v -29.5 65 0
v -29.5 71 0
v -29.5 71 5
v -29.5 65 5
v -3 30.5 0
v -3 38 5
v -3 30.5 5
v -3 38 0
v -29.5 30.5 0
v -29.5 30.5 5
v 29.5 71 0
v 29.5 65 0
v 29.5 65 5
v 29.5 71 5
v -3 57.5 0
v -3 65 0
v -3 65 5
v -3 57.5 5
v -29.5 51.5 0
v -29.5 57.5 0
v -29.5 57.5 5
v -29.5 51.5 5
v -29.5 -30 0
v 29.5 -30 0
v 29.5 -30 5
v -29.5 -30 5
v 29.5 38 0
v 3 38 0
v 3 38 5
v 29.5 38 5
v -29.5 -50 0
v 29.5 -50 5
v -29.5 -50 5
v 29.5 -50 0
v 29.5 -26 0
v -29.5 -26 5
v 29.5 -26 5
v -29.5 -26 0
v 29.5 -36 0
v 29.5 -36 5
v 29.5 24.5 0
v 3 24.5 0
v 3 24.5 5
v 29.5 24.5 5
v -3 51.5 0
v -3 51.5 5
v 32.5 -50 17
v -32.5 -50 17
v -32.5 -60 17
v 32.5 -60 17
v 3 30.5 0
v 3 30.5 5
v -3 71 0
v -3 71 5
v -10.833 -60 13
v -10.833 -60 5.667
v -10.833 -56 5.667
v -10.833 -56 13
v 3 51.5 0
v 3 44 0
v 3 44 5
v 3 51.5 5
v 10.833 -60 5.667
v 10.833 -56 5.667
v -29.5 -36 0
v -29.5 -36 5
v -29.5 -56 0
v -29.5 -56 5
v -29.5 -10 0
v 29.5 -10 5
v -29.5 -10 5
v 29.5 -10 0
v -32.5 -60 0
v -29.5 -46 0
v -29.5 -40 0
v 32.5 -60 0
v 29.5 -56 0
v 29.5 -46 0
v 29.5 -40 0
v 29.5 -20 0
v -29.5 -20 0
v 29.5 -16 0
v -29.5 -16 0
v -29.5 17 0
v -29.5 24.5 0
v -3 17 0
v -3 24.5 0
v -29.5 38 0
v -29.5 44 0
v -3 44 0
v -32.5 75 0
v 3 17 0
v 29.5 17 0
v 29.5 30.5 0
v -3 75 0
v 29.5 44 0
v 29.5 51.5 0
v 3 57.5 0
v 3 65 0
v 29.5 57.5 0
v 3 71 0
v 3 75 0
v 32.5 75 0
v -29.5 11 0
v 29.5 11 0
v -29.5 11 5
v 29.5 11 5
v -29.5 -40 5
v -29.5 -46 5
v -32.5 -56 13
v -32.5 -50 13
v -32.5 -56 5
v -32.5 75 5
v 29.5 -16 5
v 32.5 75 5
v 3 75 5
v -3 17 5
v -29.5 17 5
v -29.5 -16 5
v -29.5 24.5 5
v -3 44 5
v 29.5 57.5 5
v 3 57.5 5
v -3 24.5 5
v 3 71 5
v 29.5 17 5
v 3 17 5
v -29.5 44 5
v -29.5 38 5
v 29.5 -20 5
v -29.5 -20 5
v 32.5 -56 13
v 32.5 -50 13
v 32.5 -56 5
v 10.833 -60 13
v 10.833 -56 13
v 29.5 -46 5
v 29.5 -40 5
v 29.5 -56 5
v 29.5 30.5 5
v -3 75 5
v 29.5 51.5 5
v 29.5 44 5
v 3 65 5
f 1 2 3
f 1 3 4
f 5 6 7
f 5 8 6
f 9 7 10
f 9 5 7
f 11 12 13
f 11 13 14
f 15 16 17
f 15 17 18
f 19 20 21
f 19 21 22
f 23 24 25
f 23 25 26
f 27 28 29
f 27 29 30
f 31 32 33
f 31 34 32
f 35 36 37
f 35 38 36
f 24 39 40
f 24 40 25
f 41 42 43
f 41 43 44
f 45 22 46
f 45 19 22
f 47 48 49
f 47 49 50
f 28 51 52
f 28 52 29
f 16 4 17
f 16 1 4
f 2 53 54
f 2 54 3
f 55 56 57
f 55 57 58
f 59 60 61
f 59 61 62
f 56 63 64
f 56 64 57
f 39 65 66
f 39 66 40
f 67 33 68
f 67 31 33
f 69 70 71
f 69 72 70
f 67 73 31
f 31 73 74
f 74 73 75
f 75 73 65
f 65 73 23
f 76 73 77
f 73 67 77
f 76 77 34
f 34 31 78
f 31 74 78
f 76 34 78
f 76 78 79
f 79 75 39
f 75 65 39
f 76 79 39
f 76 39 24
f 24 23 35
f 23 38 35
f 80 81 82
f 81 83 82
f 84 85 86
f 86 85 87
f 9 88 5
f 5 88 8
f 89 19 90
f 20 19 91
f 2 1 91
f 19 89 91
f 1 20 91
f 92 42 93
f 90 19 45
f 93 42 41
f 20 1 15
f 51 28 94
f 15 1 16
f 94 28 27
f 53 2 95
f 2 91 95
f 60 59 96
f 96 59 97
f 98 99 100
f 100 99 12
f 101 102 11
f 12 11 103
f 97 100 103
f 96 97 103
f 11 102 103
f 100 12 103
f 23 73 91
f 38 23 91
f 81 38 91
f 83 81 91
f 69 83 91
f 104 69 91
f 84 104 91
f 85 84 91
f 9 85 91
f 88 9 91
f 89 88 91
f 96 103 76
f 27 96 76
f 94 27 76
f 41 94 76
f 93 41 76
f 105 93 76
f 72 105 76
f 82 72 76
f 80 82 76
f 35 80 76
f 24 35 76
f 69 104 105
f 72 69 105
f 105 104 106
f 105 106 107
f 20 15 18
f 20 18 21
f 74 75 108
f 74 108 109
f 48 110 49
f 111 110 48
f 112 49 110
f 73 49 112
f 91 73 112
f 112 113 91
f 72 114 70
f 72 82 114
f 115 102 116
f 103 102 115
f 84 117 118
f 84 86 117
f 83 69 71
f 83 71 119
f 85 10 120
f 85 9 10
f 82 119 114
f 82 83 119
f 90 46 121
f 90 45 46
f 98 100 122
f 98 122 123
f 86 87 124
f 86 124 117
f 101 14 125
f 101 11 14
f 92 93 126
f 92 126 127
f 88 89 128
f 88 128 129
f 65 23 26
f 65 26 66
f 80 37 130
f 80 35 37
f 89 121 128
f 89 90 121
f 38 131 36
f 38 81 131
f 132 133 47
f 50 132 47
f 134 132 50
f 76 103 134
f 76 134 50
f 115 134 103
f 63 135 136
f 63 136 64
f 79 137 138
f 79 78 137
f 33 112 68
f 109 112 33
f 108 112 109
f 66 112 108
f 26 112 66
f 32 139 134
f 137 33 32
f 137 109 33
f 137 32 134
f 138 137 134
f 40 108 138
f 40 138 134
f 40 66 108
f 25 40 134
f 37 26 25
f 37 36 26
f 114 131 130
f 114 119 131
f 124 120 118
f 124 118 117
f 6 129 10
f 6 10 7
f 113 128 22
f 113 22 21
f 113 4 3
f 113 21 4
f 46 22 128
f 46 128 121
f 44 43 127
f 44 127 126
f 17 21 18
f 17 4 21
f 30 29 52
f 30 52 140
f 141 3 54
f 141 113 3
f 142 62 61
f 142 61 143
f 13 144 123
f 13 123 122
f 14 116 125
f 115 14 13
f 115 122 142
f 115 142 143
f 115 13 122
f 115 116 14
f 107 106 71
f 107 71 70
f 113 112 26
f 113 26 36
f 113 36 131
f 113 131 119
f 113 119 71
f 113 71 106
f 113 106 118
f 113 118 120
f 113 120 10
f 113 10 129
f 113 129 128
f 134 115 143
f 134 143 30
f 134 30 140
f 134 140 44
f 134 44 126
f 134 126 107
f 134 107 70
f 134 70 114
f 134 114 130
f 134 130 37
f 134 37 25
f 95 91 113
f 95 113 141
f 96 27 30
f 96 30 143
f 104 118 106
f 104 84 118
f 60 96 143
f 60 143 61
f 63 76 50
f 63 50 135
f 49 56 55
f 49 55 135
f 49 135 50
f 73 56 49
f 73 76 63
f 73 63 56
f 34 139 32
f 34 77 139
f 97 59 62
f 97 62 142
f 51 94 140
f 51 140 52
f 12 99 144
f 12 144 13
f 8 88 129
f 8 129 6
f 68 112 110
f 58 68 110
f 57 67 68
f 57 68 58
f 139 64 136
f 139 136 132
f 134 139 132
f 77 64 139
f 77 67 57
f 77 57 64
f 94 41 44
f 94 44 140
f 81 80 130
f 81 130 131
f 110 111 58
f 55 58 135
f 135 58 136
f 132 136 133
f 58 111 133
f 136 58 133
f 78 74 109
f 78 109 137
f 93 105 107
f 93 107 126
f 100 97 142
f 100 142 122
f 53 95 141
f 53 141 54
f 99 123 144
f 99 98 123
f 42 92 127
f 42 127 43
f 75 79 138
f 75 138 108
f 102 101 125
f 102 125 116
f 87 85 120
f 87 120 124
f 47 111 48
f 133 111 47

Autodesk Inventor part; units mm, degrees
ref_plane "YZ Plane" through (0, 0, 0) normal (1, 0, 0) x (0, 1, 0)
ref_plane "XZ Plane" through (0, 0, 0) normal (0, 1, 0) x (-1, 0, 0)
ref_plane "XY Plane" through (0, 0, 0) normal (0, 0, 1) x (1, 0, 0)
sketch "Sketch1" plane through (0, 0, 0) normal (0, 0, 1) x (1, 0, 0)
  line L0 (-32.5, 75) -> (32.5, 75)
  line L1 (32.5, 75) -> (32.5, -60)
  line L2 (32.5, -60) -> (-32.5, -60)
  line L3 (-32.5, -60) -> (-32.5, 75)
  point P0 (0, 0)
  dimension "d0" = 65
  dimension "d1" = 135
  dimension "d2" = 32.5
  dimension "d3" = 60
extrude "Extrusion1" add sketch "Sketch1" along normal blind 5
sketch "Sketch2" plane through (0, 0, 5) normal (0, 0, 1) x (1, 0, 0)
  line L0 (-32.5, 75) -> (-32.5, -60) projected
  line L1 (-32.5, -60) -> (32.5, -60) projected
  line L2 (-32.5, -56) -> (32.5, -56)
  line L3 (32.5, -56) -> (32.5, -60)
  line L4 (32.5, -60) -> (-32.5, -60)
  line L5 (-32.5, -60) -> (-32.5, -56)
  point P0 (0, 0)
  dimension "d6" = 4
extrude "Extrusion2" add sketch "Sketch2" along normal blind 8
sketch "Sketch3" plane through (0, 0, 13) normal (0, 0, 1) x (1, 0, 0)
  line L0 (-32.5, -60) -> (-32.5, 75) projected
  line L1 (32.5, 75) -> (32.5, -60) projected
  line L2 (-32.5, -50) -> (32.5, -50)
  line L3 (32.5, -50) -> (32.5, -60)
  line L4 (32.5, -60) -> (-32.5, -60)
  line L5 (-32.5, -60) -> (-32.5, -50)
  point P0 (0, 0)
  dimension "d9" = 10
extrude "Extrusion3" add sketch "Sketch3" along normal blind 4
sketch "Sketch4" plane through (0, 0, 5) normal (0, 0, 1) x (1, 0, 0)
  line L0 (-32.5, -60) -> (-32.5, 75) projected
  line L1 (32.5, 75) -> (32.5, -60) projected
  line L2 (32.5, 75) -> (32.5, 71)
  line L3 (-32.5, 71) -> (-32.5, 75)
  point P0 (0, 0)
sketch "Sketch6" plane through (-32.5, -60, 0) normal (0, -1, 0) x (1, 0, 0)
  line L0 (65, 13) -> (0, 13) projected
  line L1 (21.6667, 13) -> (43.3333, 13)
  line L2 (43.3333, 13) -> (43.3333, 5.6667)
  line L3 (43.3333, 5.6667) -> (21.6667, 5.6667)
  line L4 (21.6667, 5.6667) -> (21.6667, 13)
  line L5 (65, 0) -> (65, 17) projected
  line L6 (0, 0) -> (0, 17) projected
  line L7 (65, 0) -> (0, 0) projected
  line L8 (0, 17) -> (65, 17) projected
  point P0 (32.5, 0)
  dimension "d18" = 21.6667
  dimension "d19" = 21.6667
  dimension "d20" = 5.6667
  dimension "d21" = 4
extrude "Extrusion6" cut sketch "Sketch6" against normal blind 206 contours L2 L3 L4 L0
sketch "Sketch7" plane through (0, 0, 0) normal (0, 0, -1) x (-1, 0, 0)
  line L0 (32.5, -56) -> (-32.5, -56) projected
  line L1 (29.5, -56) -> (-29.5, -56)
  line L2 (-29.5, -56) -> (-29.5, -50)
  line L3 (-32.5, -50) -> (32.5, -50) projected
  line L4 (-29.5, -50) -> (29.5, -50)
  line L5 (29.5, -50) -> (29.5, -56)
  line L6 (32.5, -60) -> (32.5, 75) projected
  line L7 (-32.5, 75) -> (-32.5, -60) projected
  line L8 (29.5, -46) -> (-29.5, -46)
  line L9 (-29.5, -46) -> (-29.5, -40)
  line L10 (-29.5, -40) -> (29.5, -40)
  line L11 (29.5, -40) -> (29.5, -46)
  line L12 (29.5, -36) -> (-29.5, -36)
  line L13 (-29.5, -36) -> (-29.5, -30)
  line L14 (-29.5, -30) -> (29.5, -30)
  line L15 (29.5, -30) -> (29.5, -36)
  line L16 (29.5, -26) -> (-29.5, -26)
  line L17 (-29.5, -26) -> (-29.5, -20)
  line L18 (-29.5, -20) -> (29.5, -20)
  line L19 (29.5, -20) -> (29.5, -26)
  line L20 (29.5, -16) -> (-29.5, -16)
  line L21 (-29.5, -16) -> (-29.5, -10)
  line L22 (-29.5, -10) -> (29.5, -10)
  line L23 (29.5, -10) -> (29.5, -16)
  line L24 (32.5, 65) -> (-32.5, 65) projected
  line L25 (-32.5, 71) -> (32.5, 71) projected
  line L26 (29.5, 65) -> (-29.5, 65)
  line L27 (-29.5, 65) -> (-29.5, 71)
  line L28 (-29.5, 71) -> (29.5, 71)
  line L29 (29.5, 71) -> (29.5, 65)
  line L30 (29.5, 51.5) -> (-29.5, 51.5)
  line L31 (29.5, 57.5) -> (29.5, 51.5)
  line L32 (-29.5, 57.5) -> (29.5, 57.5)
  line L33 (-29.5, 51.5) -> (-29.5, 57.5)
  line L34 (29.5, 38) -> (-29.5, 38)
  line L35 (29.5, 44) -> (29.5, 38)
  line L36 (-29.5, 44) -> (29.5, 44)
  line L37 (-29.5, 38) -> (-29.5, 44)
  line L38 (29.5, 24.5) -> (-29.5, 24.5)
  line L39 (29.5, 30.5) -> (29.5, 24.5)
  line L40 (-29.5, 30.5) -> (29.5, 30.5)
  line L41 (-29.5, 24.5) -> (-29.5, 30.5)
  line L42 (29.5, 11) -> (-29.5, 11)
  line L43 (29.5, 17) -> (29.5, 11)
  line L44 (-29.5, 17) -> (29.5, 17)
  line L45 (-29.5, 11) -> (-29.5, 17)
  point P0 (0, 0)
  dimension "d24" = 3
  dimension "d25" = 3
  dimension "d30" = 10
  dimension "d35" = 3
  dimension "d36" = 3
  dimension "d39" = 13.5
extrude "Extrusion7" cut sketch "Sketch7" against normal up to surface (5 mm away) contours L0 L2 L3 L5
extrude "Extrusion8" cut sketch "Sketch7" against normal up to surface (5 mm away) contours L24 L27 L25 L29 | L8 L9 L10 L11 | L12 L13 L14 L15 | L16 L17 L18 L19 | L20 L21 L22 L23 | L30 L33 L32 L31 | L34 L37 L36 L35 | L38 L41 L40 L39 | L42 L45 L44 L43
sketch "Sketch8" plane through (0, 0, 0) normal (0, 0, -1) x (-1, 0, 0)
  line L0 (32.5, 75) -> (-32.5, 75) projected
  line L1 (-29.5, 11) -> (29.5, 11) projected
  line L2 (-3, 75) -> (3, 75)
  line L3 (3, 75) -> (3, 11)
  line L4 (3, 11) -> (-3, 11)
  line L5 (-3, 11) -> (-3, 75)
  line L6 (32.5, -60) -> (32.5, 75) projected
  line L7 (-32.5, 75) -> (-32.5, -60) projected
  point P0 (0, 0)
  dimension "d46" = 29.5
  dimension "d47" = 29.5
extrude "Extrusion9" cut sketch "Sketch8" against normal blind 206
properties part number "Kirtiman phone charger design"
